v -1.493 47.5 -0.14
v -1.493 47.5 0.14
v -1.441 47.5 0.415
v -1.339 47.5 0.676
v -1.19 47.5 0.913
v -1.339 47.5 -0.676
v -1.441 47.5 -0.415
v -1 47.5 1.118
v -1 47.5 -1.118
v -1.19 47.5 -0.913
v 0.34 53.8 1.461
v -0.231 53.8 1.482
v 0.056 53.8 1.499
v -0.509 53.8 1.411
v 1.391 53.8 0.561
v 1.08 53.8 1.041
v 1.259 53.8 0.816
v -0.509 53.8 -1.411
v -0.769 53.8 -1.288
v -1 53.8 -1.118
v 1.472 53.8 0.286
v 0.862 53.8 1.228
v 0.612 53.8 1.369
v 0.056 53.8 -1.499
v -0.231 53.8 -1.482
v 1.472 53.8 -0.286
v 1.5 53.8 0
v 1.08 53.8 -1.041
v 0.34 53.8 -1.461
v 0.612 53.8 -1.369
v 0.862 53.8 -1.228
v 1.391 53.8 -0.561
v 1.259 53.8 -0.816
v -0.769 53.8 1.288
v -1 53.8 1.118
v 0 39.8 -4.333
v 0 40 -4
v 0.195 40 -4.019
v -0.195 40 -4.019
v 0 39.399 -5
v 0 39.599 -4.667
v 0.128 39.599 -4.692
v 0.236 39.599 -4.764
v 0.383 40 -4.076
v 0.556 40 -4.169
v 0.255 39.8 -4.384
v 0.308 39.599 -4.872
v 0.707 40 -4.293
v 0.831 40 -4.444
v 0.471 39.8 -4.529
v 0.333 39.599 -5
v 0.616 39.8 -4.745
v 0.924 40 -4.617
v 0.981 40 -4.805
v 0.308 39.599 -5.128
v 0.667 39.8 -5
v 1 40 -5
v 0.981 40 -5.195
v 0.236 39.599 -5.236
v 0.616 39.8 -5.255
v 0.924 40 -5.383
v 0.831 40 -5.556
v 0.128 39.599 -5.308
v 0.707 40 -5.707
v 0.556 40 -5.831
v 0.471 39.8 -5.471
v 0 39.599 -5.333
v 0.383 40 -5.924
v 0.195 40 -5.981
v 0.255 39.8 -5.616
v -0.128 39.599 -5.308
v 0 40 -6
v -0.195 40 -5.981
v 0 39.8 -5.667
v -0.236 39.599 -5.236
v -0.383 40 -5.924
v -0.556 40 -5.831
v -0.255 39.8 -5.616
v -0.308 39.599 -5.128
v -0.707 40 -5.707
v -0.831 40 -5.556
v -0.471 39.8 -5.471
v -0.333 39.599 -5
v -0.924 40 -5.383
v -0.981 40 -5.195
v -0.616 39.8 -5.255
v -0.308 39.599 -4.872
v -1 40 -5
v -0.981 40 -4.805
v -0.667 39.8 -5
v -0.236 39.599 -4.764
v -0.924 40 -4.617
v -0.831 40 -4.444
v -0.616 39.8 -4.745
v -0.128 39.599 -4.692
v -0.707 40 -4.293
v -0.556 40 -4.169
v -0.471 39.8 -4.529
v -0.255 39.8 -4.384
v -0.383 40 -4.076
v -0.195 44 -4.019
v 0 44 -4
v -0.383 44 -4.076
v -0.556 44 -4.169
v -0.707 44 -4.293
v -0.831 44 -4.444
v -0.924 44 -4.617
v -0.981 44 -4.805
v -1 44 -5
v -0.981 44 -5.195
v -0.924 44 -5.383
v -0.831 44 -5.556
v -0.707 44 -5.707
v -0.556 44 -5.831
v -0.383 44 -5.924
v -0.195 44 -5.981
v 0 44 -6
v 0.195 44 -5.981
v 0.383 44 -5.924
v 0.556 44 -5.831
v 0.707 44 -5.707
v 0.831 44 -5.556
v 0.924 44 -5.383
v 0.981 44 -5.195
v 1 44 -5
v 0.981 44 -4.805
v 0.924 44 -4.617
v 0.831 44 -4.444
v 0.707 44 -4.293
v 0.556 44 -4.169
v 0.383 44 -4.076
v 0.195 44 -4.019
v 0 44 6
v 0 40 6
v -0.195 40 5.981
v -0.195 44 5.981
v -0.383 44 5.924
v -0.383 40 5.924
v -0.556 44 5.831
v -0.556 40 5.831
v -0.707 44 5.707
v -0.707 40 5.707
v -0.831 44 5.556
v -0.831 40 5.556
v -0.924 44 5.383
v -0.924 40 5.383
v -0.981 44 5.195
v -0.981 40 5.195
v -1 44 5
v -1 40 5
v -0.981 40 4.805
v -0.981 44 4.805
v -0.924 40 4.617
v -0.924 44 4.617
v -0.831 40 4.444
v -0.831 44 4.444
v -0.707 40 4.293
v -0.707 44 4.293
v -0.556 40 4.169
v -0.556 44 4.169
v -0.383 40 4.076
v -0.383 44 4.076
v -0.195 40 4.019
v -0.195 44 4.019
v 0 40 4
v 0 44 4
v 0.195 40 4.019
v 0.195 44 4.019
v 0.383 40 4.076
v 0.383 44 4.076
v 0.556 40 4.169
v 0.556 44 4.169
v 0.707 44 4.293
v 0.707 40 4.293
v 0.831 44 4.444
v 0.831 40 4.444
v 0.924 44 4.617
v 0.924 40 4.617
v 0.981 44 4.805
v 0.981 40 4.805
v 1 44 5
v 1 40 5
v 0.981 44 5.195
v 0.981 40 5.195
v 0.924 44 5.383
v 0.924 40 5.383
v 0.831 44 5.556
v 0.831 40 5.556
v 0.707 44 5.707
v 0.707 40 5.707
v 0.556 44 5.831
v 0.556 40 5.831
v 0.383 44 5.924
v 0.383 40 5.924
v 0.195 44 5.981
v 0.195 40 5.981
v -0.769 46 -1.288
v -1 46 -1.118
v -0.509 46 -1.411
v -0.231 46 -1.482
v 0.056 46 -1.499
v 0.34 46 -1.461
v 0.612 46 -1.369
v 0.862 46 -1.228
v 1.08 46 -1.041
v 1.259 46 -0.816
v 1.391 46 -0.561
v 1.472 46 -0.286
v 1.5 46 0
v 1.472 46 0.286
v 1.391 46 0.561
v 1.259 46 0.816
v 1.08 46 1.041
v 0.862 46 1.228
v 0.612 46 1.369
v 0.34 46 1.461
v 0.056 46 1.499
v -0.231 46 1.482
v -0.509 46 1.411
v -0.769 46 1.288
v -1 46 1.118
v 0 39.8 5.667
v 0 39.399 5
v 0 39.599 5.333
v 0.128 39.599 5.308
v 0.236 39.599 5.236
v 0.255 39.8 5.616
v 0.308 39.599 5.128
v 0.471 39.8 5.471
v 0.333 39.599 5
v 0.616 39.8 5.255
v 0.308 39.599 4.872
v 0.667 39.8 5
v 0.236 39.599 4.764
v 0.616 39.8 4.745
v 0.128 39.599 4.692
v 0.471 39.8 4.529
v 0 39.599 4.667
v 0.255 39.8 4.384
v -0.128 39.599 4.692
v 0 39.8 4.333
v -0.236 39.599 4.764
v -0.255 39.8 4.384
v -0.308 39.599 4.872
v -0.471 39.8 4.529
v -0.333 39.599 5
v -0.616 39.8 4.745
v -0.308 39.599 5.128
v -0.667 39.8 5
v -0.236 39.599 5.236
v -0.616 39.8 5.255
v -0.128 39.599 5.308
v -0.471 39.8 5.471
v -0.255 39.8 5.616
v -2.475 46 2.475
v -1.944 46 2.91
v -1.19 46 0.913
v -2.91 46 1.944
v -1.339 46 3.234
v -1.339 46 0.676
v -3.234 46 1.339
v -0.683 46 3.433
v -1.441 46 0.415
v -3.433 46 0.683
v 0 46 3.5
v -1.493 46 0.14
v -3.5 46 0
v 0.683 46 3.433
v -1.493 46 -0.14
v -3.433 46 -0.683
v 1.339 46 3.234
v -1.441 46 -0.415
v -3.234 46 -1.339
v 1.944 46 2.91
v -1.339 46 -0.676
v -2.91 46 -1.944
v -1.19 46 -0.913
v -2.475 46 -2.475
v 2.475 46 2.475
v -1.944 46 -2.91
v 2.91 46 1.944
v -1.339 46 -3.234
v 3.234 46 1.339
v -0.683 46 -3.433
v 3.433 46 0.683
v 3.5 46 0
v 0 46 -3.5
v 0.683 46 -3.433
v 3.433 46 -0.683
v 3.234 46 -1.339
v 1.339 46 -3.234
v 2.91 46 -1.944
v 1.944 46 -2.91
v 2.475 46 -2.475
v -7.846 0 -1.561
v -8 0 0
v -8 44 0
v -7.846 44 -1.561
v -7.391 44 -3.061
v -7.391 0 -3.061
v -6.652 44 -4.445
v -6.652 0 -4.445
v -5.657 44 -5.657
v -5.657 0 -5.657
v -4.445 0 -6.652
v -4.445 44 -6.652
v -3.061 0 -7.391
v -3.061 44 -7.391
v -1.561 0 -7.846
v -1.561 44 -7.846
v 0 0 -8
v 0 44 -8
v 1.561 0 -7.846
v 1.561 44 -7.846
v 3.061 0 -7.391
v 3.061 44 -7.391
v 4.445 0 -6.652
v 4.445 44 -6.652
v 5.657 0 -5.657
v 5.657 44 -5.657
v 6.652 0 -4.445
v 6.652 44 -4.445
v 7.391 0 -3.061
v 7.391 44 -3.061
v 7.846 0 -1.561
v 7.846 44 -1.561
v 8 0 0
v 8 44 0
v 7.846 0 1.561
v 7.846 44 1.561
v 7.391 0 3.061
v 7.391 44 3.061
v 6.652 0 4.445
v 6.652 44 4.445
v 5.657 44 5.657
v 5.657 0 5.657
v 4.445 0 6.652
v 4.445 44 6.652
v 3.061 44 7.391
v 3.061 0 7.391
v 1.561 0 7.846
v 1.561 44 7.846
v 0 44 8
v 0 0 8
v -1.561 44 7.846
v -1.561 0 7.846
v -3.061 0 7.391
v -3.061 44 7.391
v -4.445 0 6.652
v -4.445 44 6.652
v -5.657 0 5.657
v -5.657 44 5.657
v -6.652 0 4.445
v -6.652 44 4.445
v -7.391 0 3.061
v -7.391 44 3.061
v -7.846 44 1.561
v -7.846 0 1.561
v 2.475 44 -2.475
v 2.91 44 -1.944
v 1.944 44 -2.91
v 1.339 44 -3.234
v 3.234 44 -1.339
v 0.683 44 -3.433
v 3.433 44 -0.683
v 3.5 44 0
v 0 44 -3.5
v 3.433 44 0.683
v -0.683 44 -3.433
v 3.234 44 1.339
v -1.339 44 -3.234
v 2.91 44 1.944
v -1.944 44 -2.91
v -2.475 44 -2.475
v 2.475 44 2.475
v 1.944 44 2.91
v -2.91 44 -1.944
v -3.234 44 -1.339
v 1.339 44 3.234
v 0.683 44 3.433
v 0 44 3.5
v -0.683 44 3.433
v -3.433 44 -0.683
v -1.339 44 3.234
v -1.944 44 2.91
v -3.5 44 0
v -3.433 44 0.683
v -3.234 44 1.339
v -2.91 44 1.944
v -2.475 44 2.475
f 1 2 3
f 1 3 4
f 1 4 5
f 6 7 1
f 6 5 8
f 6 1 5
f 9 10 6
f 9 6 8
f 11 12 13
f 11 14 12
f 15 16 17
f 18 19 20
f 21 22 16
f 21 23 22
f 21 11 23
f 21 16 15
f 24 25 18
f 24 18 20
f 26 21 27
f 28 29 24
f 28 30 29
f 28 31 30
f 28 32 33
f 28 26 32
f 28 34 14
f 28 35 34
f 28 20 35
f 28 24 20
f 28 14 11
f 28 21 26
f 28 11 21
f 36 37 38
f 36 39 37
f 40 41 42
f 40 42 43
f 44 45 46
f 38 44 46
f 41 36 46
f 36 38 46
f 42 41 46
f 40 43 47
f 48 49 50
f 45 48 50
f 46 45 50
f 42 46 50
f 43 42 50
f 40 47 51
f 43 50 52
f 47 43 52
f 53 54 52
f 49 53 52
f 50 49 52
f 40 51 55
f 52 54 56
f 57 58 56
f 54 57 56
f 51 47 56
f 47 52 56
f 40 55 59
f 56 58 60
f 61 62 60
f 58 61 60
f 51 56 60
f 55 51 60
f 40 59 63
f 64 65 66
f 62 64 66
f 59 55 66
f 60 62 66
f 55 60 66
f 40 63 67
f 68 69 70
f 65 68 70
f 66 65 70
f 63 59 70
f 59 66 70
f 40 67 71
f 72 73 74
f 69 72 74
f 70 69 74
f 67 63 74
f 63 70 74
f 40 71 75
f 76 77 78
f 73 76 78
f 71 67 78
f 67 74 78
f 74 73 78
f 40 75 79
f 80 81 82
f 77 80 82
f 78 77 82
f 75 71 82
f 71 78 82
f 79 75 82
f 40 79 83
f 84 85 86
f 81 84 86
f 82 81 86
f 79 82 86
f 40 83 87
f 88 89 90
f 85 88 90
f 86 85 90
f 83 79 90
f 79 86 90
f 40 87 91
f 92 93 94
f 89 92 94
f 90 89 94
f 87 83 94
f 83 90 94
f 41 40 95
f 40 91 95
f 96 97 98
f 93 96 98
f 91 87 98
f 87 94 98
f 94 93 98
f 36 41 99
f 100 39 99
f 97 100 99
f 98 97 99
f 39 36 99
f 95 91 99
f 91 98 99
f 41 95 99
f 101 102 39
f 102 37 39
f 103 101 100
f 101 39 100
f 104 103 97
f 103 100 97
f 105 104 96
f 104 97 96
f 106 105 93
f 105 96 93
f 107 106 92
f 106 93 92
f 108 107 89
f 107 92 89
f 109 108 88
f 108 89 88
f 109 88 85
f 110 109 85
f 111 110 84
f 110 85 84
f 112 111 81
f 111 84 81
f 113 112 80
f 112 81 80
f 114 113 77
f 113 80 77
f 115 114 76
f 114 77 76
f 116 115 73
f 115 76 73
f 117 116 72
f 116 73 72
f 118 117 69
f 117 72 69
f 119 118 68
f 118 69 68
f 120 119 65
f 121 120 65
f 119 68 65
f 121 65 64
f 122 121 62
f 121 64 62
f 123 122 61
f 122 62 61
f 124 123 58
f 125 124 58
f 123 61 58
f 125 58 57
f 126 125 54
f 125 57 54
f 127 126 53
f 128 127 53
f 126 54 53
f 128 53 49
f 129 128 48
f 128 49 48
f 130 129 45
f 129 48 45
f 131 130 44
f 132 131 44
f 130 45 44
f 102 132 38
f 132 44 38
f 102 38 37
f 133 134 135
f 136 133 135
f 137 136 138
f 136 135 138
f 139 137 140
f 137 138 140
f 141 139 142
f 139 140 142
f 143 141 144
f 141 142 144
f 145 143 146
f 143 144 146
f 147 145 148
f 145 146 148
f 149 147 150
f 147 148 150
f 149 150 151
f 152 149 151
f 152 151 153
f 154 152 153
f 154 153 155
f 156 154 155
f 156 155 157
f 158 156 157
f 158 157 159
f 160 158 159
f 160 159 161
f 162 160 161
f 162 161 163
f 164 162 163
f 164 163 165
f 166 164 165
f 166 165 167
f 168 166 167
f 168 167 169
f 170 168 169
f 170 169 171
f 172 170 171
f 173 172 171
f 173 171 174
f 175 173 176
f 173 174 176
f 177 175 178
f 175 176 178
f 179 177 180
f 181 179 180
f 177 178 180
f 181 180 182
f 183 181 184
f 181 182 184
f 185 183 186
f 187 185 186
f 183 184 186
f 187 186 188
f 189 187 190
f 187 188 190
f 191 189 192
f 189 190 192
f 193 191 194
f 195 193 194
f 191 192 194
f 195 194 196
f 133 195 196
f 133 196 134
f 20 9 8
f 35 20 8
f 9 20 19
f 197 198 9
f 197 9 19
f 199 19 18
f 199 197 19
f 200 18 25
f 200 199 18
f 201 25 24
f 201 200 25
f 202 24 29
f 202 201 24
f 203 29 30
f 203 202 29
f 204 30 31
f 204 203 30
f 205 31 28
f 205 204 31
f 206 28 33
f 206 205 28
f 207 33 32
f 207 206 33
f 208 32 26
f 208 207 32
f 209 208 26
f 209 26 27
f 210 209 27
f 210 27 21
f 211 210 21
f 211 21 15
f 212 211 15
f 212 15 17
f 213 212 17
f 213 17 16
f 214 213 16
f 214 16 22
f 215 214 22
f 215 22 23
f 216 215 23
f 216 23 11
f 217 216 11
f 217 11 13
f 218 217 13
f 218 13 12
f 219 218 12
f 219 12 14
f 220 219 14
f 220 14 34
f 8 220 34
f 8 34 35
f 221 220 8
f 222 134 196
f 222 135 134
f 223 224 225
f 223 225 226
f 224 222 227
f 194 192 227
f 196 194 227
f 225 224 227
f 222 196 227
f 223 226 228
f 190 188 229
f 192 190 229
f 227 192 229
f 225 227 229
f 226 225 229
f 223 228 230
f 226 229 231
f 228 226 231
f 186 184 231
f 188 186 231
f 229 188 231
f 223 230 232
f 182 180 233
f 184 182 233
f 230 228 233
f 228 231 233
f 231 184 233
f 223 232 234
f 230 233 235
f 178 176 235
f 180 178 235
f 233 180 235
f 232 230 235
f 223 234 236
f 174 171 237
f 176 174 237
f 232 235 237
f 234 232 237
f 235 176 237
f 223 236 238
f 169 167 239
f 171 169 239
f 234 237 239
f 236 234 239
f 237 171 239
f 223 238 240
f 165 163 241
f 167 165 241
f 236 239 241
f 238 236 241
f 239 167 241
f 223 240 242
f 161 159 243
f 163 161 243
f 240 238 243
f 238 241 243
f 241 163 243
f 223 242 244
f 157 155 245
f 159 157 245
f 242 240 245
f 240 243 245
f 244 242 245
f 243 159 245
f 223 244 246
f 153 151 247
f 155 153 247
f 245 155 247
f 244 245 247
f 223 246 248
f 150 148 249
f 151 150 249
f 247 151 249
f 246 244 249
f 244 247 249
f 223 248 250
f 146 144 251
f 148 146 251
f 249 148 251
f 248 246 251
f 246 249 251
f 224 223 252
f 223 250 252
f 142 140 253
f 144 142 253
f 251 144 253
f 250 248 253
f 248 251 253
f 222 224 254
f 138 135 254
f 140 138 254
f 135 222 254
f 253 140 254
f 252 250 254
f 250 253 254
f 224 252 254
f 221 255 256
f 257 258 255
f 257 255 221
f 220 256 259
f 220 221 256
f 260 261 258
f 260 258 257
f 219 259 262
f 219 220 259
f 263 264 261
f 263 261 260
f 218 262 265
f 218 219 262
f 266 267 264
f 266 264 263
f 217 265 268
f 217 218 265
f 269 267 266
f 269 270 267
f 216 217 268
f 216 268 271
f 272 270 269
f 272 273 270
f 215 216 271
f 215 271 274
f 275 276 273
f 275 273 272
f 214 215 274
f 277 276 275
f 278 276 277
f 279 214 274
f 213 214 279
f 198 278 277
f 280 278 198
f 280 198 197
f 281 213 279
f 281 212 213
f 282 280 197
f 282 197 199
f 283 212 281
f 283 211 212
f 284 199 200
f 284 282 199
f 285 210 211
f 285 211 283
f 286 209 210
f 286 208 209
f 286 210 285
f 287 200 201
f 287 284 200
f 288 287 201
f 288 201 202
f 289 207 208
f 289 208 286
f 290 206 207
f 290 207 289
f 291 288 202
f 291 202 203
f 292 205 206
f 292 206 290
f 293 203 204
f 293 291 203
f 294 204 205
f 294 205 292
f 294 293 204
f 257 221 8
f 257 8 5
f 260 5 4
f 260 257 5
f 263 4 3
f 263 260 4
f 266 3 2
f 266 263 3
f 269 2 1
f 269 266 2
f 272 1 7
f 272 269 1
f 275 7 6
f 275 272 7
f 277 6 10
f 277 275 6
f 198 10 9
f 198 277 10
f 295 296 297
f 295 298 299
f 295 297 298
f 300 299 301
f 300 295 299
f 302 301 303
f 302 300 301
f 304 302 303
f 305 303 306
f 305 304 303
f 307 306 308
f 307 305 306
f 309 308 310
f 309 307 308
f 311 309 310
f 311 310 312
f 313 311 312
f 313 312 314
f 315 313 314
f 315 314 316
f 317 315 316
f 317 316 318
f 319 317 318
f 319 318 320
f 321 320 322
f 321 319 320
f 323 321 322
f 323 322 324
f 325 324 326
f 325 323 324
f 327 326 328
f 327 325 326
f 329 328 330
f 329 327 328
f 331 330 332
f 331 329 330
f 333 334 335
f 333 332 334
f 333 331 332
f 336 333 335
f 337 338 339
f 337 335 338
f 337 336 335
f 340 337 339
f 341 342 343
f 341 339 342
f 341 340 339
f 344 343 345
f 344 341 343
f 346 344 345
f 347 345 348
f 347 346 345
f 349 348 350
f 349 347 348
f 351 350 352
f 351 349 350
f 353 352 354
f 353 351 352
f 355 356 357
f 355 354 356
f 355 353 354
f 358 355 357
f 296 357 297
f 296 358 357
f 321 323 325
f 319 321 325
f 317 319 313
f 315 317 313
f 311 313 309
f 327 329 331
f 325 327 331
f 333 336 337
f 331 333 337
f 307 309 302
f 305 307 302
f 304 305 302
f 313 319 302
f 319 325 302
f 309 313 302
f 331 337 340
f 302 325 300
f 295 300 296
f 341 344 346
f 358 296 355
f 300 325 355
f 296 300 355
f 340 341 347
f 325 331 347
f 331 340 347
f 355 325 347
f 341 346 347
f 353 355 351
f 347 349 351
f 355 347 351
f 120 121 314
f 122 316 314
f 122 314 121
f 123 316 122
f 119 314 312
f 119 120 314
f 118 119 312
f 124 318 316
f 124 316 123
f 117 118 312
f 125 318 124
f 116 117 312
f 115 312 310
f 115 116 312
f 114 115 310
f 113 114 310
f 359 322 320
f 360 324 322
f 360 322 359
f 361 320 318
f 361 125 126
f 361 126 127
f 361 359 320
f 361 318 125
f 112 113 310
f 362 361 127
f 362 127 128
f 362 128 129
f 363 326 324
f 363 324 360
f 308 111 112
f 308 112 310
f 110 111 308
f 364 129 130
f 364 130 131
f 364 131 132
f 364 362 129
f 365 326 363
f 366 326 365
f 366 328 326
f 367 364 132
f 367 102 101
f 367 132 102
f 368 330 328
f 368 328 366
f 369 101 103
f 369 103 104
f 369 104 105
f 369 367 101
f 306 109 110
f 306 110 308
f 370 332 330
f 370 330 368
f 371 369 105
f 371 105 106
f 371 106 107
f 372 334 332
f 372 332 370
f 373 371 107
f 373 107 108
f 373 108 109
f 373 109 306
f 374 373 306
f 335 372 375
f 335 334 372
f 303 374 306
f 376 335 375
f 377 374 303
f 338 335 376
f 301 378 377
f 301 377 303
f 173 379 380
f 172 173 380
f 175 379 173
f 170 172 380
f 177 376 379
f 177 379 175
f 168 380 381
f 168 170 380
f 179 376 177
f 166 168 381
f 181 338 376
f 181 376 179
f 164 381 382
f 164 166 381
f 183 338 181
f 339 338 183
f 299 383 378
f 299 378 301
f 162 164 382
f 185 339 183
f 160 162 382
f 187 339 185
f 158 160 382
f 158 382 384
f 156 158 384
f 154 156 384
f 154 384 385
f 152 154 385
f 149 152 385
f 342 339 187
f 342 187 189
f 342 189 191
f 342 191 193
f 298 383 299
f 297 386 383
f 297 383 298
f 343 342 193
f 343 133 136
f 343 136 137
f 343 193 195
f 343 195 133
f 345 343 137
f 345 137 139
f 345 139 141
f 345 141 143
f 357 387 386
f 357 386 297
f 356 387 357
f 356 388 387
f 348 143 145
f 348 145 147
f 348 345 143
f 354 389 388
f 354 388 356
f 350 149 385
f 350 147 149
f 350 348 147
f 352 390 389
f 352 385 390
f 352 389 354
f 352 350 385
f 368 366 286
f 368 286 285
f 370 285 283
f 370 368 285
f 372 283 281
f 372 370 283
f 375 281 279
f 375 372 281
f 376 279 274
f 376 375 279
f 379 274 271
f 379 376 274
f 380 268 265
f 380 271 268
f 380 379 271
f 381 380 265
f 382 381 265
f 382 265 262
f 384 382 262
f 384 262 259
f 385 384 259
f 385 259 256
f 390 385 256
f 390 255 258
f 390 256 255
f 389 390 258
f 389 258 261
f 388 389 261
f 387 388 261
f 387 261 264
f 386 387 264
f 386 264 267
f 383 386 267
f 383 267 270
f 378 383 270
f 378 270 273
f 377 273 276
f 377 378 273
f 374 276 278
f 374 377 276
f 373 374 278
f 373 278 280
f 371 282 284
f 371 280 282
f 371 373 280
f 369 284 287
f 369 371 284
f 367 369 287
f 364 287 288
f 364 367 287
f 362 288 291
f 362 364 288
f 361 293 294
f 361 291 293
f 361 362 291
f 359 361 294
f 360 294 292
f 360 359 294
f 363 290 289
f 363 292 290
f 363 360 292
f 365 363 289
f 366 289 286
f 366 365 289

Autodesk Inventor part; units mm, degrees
ref_plane "YZ Plane" through (0, 0, 0) normal (1, 0, 0) x (0, 1, 0)
ref_plane "XZ Plane" through (0, 0, 0) normal (0, 1, 0) x (-1, 0, 0)
ref_plane "XY Plane" through (0, 0, 0) normal (0, 0, 1) x (1, 0, 0)
sketch "Boceto1" plane through (0, 0, 0) normal (0, 1, 0) x (-1, 0, 0)
  circle A0 centre (0, 0) radius 8
  dimension "d0" = 16
extrude "Extrusión1" add sketch "Boceto1" along normal blind 44
sketch "Boceto2" plane through (0, 44, 0) normal (0, 1, 0) x (1, 0, 0)
  circle A0 centre (0, 0) radius 3.5
  dimension "d3" = 7
extrude "Extrusión2" add sketch "Boceto2" along normal blind 2
sketch "Boceto3" plane through (0, 46, 0) normal (0, 1, 0) x (1, 0, 0)
  arc A0 (-1, -1.118) -> (-1, 1.118) centre (0, 0) ccw
  line L0 (1.5, 0) -> (-1, 0)
  line L1 (-1, 0) -> (-1, 1.118)
  line L2 (-1, 0) -> (-1, -1.118)
  dimension "d6" = 3
  dimension "d7" = 2.5
extrude "Extrusión3" add sketch "Boceto3" along normal blind 7.8
sketch "Boceto4" plane through (0, 46, 0) normal (0, 1, 0) x (1, 0, 0)
  line L0 (-1, 1.118) -> (-1, -1.118) projected
  circle A0 centre (0, 0) radius 1.5
extrude "Extrusión4" add sketch "Boceto4" along normal blind 1.5 contours L0 A0 picked at (-1.1631, -0.0599)
sketch "Boceto5" plane through (0, 44, 0) normal (0, 1, 0) x (1, 0, 0)
  circle A0 centre (0, 0) radius 1.5 projected
  circle A1 centre (0, 0) radius 5
  circle A2 centre (0, 5) radius 1
  circle A3 centre (0, -5) radius 1
  dimension "d12" = 10
  dimension "d13" = 2
  dimension "d14" = 2
hole "Agujero1" at (0, 44, -5) at (0, 44, 5) direction (0, -1, 0) diameter 2 depth 4 tip angle 118
properties part number "motor2"
